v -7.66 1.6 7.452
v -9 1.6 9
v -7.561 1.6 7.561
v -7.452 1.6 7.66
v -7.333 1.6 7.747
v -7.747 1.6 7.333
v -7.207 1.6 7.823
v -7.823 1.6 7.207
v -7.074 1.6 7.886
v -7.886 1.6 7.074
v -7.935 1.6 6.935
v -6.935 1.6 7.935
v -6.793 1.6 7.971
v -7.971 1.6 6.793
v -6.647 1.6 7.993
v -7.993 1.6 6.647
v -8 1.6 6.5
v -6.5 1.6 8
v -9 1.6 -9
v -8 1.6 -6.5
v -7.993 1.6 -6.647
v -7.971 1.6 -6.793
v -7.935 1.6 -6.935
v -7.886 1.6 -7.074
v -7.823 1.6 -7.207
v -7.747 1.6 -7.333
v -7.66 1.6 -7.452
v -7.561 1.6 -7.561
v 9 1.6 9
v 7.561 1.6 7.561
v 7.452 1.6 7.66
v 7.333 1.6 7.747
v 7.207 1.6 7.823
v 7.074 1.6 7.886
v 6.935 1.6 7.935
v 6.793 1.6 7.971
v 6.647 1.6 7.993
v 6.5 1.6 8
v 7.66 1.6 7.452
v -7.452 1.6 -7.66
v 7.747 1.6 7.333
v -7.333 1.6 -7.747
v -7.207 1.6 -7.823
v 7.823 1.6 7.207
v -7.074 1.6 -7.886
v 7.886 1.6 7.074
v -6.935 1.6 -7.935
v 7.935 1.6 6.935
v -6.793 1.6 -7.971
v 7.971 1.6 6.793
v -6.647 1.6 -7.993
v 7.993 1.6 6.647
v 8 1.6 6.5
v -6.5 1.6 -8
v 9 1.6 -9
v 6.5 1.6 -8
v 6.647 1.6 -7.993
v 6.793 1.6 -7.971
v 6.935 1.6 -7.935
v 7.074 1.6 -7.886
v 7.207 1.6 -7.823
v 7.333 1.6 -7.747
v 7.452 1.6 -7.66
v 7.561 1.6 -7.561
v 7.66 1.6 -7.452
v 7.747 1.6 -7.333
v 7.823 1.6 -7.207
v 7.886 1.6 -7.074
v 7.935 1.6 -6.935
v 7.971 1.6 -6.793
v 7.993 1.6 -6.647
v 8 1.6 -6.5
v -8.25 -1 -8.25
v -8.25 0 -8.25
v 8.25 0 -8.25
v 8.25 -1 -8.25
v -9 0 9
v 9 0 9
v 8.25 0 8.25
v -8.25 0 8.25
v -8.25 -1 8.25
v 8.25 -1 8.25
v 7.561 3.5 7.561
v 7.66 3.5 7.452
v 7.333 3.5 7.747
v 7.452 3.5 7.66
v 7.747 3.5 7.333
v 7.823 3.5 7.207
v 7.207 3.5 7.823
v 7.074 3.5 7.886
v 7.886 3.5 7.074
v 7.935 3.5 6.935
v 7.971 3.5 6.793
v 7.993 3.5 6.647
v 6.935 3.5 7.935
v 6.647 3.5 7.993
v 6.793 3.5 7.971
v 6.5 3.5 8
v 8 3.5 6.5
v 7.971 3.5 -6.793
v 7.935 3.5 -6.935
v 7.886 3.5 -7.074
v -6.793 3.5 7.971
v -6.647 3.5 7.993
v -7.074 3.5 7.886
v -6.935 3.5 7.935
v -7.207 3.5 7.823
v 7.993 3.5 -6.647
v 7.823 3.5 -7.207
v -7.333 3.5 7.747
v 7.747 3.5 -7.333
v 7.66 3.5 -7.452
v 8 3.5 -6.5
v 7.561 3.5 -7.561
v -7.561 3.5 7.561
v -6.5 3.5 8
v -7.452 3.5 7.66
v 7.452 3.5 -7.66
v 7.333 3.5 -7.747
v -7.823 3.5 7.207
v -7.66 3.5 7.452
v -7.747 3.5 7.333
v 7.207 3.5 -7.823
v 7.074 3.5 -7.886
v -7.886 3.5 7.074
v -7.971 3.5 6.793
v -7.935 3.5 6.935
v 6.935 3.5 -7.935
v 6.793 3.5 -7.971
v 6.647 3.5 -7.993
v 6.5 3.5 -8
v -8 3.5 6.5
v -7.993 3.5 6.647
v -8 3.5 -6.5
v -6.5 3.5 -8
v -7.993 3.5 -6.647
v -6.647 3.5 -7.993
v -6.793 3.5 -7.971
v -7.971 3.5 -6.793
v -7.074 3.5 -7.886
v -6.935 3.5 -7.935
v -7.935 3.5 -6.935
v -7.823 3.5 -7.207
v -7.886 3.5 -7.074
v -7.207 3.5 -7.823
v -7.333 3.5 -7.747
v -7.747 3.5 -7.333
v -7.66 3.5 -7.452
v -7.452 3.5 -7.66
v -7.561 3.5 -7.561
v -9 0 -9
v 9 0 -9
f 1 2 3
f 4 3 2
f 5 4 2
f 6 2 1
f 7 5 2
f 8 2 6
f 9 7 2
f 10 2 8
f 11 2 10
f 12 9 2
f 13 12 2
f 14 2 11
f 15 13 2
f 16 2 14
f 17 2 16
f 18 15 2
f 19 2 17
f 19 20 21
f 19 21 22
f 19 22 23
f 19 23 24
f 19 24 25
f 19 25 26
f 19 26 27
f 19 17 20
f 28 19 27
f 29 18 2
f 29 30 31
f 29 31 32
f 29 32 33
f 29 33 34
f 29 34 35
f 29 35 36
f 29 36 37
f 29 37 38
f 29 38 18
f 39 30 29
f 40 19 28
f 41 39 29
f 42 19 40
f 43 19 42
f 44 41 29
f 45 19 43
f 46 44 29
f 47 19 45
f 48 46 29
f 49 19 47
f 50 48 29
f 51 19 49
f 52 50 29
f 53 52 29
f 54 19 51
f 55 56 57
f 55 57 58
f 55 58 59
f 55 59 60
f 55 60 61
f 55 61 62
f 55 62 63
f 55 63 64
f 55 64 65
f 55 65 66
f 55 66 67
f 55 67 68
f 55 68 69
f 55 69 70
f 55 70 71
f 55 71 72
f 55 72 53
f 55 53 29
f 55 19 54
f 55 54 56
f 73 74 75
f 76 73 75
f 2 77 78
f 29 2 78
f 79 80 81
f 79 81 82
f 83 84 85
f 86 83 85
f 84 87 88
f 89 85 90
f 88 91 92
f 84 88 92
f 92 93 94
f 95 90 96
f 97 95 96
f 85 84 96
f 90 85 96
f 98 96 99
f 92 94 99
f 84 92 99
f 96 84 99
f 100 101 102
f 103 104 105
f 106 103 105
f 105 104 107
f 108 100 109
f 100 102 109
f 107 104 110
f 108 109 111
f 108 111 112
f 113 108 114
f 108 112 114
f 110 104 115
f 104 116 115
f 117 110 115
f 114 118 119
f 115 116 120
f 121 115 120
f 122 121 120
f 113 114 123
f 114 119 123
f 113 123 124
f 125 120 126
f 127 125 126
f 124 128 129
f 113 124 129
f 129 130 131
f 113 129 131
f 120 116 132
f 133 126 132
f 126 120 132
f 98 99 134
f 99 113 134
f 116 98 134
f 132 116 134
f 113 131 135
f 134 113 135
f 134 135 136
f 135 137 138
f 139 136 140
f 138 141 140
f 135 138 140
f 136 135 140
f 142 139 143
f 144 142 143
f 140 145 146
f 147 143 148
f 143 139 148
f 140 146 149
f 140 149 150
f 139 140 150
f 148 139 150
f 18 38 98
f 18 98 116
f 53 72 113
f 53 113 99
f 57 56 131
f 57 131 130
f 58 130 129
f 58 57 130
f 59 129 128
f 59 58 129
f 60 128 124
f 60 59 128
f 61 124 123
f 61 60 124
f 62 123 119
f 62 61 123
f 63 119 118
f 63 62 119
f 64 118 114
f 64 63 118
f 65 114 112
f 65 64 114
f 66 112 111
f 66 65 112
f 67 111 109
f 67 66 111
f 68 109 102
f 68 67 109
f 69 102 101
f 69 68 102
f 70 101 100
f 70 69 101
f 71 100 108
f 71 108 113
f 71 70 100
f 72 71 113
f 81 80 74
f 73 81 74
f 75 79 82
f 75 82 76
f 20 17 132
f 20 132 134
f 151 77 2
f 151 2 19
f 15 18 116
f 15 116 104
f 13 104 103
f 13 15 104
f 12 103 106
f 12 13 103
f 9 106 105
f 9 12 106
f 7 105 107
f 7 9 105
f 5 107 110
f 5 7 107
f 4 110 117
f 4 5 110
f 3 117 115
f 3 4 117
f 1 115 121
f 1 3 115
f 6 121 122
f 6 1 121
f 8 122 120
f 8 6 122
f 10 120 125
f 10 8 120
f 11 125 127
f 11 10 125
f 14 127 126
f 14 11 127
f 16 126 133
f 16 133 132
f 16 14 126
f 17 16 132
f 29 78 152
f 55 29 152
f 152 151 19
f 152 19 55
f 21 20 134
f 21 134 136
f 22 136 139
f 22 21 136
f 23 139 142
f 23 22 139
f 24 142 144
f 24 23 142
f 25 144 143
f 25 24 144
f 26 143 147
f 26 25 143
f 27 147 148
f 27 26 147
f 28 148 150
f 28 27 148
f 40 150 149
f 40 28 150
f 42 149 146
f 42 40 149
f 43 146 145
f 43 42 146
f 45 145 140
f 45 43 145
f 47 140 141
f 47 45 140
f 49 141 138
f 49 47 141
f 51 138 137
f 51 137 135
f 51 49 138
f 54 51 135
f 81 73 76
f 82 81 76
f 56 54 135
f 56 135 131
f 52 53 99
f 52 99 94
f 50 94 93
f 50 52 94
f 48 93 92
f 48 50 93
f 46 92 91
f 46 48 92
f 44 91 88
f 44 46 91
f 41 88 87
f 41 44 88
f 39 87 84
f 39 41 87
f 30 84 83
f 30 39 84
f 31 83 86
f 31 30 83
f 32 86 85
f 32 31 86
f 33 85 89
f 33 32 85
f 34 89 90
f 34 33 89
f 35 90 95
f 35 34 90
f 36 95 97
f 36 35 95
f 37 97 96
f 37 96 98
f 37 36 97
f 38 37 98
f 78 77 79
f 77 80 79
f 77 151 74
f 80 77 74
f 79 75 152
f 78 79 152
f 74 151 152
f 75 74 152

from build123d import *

# Parameters (mm, degrees)
SKETCH_1_W      = 18
SKETCH_1_H      = 18
EXTRUDE_1_DEPTH = 1.6
EXTRUDE_START   = 1.6
EXTRUDE_2_DEPTH = 1.9
SKETCH_3_W      = 16.5
SKETCH_3_H      = 16.5
EXTRUDE_3_DEPTH = 1


with BuildPart() as part:
    # 草图1 → 凸台-拉伸1 (new body)
    with BuildSketch(Plane(origin=(0, 0, 0), x_dir=(1, 0, 0), z_dir=(0, 1, 0))):
        Rectangle(SKETCH_1_W, SKETCH_1_H)
    extrude(amount=EXTRUDE_1_DEPTH)

    # 草图2 → 凸台-拉伸2 (add)
    with BuildSketch(Plane(origin=(0, 0, 0), x_dir=(1, 0, 0), z_dir=(0, 1, 0)).offset(EXTRUDE_START)):
        with BuildLine():
            Line((-6.5, 8), (6.5, 8))
            ThreePointArc((6.5, 8), (7.560660172, 7.560660172), (8, 6.5))
            Line((8, 6.5), (8, -6.5))
            ThreePointArc((8, -6.5), (7.560660172, -7.560660172), (6.5, -8))
            Line((6.5, -8), (-6.5, -8))
            ThreePointArc((-6.5, -8), (-7.560660172, -7.560660172), (-8, -6.5))
            Line((-8, -6.5), (-8, 6.5))
            ThreePointArc((-8, 6.5), (-7.560660172, 7.560660172), (-6.5, 8))
        make_face()
    extrude(amount=EXTRUDE_2_DEPTH)

    # 草图3 → 凸台-拉伸3 (add)
    with BuildSketch(Plane(origin=(0, 0, 0), x_dir=(1, 0, 0), z_dir=(0, 1, 0))):
        Rectangle(SKETCH_3_W, SKETCH_3_H)
    extrude(amount=-EXTRUDE_3_DEPTH)


solid = part.part
